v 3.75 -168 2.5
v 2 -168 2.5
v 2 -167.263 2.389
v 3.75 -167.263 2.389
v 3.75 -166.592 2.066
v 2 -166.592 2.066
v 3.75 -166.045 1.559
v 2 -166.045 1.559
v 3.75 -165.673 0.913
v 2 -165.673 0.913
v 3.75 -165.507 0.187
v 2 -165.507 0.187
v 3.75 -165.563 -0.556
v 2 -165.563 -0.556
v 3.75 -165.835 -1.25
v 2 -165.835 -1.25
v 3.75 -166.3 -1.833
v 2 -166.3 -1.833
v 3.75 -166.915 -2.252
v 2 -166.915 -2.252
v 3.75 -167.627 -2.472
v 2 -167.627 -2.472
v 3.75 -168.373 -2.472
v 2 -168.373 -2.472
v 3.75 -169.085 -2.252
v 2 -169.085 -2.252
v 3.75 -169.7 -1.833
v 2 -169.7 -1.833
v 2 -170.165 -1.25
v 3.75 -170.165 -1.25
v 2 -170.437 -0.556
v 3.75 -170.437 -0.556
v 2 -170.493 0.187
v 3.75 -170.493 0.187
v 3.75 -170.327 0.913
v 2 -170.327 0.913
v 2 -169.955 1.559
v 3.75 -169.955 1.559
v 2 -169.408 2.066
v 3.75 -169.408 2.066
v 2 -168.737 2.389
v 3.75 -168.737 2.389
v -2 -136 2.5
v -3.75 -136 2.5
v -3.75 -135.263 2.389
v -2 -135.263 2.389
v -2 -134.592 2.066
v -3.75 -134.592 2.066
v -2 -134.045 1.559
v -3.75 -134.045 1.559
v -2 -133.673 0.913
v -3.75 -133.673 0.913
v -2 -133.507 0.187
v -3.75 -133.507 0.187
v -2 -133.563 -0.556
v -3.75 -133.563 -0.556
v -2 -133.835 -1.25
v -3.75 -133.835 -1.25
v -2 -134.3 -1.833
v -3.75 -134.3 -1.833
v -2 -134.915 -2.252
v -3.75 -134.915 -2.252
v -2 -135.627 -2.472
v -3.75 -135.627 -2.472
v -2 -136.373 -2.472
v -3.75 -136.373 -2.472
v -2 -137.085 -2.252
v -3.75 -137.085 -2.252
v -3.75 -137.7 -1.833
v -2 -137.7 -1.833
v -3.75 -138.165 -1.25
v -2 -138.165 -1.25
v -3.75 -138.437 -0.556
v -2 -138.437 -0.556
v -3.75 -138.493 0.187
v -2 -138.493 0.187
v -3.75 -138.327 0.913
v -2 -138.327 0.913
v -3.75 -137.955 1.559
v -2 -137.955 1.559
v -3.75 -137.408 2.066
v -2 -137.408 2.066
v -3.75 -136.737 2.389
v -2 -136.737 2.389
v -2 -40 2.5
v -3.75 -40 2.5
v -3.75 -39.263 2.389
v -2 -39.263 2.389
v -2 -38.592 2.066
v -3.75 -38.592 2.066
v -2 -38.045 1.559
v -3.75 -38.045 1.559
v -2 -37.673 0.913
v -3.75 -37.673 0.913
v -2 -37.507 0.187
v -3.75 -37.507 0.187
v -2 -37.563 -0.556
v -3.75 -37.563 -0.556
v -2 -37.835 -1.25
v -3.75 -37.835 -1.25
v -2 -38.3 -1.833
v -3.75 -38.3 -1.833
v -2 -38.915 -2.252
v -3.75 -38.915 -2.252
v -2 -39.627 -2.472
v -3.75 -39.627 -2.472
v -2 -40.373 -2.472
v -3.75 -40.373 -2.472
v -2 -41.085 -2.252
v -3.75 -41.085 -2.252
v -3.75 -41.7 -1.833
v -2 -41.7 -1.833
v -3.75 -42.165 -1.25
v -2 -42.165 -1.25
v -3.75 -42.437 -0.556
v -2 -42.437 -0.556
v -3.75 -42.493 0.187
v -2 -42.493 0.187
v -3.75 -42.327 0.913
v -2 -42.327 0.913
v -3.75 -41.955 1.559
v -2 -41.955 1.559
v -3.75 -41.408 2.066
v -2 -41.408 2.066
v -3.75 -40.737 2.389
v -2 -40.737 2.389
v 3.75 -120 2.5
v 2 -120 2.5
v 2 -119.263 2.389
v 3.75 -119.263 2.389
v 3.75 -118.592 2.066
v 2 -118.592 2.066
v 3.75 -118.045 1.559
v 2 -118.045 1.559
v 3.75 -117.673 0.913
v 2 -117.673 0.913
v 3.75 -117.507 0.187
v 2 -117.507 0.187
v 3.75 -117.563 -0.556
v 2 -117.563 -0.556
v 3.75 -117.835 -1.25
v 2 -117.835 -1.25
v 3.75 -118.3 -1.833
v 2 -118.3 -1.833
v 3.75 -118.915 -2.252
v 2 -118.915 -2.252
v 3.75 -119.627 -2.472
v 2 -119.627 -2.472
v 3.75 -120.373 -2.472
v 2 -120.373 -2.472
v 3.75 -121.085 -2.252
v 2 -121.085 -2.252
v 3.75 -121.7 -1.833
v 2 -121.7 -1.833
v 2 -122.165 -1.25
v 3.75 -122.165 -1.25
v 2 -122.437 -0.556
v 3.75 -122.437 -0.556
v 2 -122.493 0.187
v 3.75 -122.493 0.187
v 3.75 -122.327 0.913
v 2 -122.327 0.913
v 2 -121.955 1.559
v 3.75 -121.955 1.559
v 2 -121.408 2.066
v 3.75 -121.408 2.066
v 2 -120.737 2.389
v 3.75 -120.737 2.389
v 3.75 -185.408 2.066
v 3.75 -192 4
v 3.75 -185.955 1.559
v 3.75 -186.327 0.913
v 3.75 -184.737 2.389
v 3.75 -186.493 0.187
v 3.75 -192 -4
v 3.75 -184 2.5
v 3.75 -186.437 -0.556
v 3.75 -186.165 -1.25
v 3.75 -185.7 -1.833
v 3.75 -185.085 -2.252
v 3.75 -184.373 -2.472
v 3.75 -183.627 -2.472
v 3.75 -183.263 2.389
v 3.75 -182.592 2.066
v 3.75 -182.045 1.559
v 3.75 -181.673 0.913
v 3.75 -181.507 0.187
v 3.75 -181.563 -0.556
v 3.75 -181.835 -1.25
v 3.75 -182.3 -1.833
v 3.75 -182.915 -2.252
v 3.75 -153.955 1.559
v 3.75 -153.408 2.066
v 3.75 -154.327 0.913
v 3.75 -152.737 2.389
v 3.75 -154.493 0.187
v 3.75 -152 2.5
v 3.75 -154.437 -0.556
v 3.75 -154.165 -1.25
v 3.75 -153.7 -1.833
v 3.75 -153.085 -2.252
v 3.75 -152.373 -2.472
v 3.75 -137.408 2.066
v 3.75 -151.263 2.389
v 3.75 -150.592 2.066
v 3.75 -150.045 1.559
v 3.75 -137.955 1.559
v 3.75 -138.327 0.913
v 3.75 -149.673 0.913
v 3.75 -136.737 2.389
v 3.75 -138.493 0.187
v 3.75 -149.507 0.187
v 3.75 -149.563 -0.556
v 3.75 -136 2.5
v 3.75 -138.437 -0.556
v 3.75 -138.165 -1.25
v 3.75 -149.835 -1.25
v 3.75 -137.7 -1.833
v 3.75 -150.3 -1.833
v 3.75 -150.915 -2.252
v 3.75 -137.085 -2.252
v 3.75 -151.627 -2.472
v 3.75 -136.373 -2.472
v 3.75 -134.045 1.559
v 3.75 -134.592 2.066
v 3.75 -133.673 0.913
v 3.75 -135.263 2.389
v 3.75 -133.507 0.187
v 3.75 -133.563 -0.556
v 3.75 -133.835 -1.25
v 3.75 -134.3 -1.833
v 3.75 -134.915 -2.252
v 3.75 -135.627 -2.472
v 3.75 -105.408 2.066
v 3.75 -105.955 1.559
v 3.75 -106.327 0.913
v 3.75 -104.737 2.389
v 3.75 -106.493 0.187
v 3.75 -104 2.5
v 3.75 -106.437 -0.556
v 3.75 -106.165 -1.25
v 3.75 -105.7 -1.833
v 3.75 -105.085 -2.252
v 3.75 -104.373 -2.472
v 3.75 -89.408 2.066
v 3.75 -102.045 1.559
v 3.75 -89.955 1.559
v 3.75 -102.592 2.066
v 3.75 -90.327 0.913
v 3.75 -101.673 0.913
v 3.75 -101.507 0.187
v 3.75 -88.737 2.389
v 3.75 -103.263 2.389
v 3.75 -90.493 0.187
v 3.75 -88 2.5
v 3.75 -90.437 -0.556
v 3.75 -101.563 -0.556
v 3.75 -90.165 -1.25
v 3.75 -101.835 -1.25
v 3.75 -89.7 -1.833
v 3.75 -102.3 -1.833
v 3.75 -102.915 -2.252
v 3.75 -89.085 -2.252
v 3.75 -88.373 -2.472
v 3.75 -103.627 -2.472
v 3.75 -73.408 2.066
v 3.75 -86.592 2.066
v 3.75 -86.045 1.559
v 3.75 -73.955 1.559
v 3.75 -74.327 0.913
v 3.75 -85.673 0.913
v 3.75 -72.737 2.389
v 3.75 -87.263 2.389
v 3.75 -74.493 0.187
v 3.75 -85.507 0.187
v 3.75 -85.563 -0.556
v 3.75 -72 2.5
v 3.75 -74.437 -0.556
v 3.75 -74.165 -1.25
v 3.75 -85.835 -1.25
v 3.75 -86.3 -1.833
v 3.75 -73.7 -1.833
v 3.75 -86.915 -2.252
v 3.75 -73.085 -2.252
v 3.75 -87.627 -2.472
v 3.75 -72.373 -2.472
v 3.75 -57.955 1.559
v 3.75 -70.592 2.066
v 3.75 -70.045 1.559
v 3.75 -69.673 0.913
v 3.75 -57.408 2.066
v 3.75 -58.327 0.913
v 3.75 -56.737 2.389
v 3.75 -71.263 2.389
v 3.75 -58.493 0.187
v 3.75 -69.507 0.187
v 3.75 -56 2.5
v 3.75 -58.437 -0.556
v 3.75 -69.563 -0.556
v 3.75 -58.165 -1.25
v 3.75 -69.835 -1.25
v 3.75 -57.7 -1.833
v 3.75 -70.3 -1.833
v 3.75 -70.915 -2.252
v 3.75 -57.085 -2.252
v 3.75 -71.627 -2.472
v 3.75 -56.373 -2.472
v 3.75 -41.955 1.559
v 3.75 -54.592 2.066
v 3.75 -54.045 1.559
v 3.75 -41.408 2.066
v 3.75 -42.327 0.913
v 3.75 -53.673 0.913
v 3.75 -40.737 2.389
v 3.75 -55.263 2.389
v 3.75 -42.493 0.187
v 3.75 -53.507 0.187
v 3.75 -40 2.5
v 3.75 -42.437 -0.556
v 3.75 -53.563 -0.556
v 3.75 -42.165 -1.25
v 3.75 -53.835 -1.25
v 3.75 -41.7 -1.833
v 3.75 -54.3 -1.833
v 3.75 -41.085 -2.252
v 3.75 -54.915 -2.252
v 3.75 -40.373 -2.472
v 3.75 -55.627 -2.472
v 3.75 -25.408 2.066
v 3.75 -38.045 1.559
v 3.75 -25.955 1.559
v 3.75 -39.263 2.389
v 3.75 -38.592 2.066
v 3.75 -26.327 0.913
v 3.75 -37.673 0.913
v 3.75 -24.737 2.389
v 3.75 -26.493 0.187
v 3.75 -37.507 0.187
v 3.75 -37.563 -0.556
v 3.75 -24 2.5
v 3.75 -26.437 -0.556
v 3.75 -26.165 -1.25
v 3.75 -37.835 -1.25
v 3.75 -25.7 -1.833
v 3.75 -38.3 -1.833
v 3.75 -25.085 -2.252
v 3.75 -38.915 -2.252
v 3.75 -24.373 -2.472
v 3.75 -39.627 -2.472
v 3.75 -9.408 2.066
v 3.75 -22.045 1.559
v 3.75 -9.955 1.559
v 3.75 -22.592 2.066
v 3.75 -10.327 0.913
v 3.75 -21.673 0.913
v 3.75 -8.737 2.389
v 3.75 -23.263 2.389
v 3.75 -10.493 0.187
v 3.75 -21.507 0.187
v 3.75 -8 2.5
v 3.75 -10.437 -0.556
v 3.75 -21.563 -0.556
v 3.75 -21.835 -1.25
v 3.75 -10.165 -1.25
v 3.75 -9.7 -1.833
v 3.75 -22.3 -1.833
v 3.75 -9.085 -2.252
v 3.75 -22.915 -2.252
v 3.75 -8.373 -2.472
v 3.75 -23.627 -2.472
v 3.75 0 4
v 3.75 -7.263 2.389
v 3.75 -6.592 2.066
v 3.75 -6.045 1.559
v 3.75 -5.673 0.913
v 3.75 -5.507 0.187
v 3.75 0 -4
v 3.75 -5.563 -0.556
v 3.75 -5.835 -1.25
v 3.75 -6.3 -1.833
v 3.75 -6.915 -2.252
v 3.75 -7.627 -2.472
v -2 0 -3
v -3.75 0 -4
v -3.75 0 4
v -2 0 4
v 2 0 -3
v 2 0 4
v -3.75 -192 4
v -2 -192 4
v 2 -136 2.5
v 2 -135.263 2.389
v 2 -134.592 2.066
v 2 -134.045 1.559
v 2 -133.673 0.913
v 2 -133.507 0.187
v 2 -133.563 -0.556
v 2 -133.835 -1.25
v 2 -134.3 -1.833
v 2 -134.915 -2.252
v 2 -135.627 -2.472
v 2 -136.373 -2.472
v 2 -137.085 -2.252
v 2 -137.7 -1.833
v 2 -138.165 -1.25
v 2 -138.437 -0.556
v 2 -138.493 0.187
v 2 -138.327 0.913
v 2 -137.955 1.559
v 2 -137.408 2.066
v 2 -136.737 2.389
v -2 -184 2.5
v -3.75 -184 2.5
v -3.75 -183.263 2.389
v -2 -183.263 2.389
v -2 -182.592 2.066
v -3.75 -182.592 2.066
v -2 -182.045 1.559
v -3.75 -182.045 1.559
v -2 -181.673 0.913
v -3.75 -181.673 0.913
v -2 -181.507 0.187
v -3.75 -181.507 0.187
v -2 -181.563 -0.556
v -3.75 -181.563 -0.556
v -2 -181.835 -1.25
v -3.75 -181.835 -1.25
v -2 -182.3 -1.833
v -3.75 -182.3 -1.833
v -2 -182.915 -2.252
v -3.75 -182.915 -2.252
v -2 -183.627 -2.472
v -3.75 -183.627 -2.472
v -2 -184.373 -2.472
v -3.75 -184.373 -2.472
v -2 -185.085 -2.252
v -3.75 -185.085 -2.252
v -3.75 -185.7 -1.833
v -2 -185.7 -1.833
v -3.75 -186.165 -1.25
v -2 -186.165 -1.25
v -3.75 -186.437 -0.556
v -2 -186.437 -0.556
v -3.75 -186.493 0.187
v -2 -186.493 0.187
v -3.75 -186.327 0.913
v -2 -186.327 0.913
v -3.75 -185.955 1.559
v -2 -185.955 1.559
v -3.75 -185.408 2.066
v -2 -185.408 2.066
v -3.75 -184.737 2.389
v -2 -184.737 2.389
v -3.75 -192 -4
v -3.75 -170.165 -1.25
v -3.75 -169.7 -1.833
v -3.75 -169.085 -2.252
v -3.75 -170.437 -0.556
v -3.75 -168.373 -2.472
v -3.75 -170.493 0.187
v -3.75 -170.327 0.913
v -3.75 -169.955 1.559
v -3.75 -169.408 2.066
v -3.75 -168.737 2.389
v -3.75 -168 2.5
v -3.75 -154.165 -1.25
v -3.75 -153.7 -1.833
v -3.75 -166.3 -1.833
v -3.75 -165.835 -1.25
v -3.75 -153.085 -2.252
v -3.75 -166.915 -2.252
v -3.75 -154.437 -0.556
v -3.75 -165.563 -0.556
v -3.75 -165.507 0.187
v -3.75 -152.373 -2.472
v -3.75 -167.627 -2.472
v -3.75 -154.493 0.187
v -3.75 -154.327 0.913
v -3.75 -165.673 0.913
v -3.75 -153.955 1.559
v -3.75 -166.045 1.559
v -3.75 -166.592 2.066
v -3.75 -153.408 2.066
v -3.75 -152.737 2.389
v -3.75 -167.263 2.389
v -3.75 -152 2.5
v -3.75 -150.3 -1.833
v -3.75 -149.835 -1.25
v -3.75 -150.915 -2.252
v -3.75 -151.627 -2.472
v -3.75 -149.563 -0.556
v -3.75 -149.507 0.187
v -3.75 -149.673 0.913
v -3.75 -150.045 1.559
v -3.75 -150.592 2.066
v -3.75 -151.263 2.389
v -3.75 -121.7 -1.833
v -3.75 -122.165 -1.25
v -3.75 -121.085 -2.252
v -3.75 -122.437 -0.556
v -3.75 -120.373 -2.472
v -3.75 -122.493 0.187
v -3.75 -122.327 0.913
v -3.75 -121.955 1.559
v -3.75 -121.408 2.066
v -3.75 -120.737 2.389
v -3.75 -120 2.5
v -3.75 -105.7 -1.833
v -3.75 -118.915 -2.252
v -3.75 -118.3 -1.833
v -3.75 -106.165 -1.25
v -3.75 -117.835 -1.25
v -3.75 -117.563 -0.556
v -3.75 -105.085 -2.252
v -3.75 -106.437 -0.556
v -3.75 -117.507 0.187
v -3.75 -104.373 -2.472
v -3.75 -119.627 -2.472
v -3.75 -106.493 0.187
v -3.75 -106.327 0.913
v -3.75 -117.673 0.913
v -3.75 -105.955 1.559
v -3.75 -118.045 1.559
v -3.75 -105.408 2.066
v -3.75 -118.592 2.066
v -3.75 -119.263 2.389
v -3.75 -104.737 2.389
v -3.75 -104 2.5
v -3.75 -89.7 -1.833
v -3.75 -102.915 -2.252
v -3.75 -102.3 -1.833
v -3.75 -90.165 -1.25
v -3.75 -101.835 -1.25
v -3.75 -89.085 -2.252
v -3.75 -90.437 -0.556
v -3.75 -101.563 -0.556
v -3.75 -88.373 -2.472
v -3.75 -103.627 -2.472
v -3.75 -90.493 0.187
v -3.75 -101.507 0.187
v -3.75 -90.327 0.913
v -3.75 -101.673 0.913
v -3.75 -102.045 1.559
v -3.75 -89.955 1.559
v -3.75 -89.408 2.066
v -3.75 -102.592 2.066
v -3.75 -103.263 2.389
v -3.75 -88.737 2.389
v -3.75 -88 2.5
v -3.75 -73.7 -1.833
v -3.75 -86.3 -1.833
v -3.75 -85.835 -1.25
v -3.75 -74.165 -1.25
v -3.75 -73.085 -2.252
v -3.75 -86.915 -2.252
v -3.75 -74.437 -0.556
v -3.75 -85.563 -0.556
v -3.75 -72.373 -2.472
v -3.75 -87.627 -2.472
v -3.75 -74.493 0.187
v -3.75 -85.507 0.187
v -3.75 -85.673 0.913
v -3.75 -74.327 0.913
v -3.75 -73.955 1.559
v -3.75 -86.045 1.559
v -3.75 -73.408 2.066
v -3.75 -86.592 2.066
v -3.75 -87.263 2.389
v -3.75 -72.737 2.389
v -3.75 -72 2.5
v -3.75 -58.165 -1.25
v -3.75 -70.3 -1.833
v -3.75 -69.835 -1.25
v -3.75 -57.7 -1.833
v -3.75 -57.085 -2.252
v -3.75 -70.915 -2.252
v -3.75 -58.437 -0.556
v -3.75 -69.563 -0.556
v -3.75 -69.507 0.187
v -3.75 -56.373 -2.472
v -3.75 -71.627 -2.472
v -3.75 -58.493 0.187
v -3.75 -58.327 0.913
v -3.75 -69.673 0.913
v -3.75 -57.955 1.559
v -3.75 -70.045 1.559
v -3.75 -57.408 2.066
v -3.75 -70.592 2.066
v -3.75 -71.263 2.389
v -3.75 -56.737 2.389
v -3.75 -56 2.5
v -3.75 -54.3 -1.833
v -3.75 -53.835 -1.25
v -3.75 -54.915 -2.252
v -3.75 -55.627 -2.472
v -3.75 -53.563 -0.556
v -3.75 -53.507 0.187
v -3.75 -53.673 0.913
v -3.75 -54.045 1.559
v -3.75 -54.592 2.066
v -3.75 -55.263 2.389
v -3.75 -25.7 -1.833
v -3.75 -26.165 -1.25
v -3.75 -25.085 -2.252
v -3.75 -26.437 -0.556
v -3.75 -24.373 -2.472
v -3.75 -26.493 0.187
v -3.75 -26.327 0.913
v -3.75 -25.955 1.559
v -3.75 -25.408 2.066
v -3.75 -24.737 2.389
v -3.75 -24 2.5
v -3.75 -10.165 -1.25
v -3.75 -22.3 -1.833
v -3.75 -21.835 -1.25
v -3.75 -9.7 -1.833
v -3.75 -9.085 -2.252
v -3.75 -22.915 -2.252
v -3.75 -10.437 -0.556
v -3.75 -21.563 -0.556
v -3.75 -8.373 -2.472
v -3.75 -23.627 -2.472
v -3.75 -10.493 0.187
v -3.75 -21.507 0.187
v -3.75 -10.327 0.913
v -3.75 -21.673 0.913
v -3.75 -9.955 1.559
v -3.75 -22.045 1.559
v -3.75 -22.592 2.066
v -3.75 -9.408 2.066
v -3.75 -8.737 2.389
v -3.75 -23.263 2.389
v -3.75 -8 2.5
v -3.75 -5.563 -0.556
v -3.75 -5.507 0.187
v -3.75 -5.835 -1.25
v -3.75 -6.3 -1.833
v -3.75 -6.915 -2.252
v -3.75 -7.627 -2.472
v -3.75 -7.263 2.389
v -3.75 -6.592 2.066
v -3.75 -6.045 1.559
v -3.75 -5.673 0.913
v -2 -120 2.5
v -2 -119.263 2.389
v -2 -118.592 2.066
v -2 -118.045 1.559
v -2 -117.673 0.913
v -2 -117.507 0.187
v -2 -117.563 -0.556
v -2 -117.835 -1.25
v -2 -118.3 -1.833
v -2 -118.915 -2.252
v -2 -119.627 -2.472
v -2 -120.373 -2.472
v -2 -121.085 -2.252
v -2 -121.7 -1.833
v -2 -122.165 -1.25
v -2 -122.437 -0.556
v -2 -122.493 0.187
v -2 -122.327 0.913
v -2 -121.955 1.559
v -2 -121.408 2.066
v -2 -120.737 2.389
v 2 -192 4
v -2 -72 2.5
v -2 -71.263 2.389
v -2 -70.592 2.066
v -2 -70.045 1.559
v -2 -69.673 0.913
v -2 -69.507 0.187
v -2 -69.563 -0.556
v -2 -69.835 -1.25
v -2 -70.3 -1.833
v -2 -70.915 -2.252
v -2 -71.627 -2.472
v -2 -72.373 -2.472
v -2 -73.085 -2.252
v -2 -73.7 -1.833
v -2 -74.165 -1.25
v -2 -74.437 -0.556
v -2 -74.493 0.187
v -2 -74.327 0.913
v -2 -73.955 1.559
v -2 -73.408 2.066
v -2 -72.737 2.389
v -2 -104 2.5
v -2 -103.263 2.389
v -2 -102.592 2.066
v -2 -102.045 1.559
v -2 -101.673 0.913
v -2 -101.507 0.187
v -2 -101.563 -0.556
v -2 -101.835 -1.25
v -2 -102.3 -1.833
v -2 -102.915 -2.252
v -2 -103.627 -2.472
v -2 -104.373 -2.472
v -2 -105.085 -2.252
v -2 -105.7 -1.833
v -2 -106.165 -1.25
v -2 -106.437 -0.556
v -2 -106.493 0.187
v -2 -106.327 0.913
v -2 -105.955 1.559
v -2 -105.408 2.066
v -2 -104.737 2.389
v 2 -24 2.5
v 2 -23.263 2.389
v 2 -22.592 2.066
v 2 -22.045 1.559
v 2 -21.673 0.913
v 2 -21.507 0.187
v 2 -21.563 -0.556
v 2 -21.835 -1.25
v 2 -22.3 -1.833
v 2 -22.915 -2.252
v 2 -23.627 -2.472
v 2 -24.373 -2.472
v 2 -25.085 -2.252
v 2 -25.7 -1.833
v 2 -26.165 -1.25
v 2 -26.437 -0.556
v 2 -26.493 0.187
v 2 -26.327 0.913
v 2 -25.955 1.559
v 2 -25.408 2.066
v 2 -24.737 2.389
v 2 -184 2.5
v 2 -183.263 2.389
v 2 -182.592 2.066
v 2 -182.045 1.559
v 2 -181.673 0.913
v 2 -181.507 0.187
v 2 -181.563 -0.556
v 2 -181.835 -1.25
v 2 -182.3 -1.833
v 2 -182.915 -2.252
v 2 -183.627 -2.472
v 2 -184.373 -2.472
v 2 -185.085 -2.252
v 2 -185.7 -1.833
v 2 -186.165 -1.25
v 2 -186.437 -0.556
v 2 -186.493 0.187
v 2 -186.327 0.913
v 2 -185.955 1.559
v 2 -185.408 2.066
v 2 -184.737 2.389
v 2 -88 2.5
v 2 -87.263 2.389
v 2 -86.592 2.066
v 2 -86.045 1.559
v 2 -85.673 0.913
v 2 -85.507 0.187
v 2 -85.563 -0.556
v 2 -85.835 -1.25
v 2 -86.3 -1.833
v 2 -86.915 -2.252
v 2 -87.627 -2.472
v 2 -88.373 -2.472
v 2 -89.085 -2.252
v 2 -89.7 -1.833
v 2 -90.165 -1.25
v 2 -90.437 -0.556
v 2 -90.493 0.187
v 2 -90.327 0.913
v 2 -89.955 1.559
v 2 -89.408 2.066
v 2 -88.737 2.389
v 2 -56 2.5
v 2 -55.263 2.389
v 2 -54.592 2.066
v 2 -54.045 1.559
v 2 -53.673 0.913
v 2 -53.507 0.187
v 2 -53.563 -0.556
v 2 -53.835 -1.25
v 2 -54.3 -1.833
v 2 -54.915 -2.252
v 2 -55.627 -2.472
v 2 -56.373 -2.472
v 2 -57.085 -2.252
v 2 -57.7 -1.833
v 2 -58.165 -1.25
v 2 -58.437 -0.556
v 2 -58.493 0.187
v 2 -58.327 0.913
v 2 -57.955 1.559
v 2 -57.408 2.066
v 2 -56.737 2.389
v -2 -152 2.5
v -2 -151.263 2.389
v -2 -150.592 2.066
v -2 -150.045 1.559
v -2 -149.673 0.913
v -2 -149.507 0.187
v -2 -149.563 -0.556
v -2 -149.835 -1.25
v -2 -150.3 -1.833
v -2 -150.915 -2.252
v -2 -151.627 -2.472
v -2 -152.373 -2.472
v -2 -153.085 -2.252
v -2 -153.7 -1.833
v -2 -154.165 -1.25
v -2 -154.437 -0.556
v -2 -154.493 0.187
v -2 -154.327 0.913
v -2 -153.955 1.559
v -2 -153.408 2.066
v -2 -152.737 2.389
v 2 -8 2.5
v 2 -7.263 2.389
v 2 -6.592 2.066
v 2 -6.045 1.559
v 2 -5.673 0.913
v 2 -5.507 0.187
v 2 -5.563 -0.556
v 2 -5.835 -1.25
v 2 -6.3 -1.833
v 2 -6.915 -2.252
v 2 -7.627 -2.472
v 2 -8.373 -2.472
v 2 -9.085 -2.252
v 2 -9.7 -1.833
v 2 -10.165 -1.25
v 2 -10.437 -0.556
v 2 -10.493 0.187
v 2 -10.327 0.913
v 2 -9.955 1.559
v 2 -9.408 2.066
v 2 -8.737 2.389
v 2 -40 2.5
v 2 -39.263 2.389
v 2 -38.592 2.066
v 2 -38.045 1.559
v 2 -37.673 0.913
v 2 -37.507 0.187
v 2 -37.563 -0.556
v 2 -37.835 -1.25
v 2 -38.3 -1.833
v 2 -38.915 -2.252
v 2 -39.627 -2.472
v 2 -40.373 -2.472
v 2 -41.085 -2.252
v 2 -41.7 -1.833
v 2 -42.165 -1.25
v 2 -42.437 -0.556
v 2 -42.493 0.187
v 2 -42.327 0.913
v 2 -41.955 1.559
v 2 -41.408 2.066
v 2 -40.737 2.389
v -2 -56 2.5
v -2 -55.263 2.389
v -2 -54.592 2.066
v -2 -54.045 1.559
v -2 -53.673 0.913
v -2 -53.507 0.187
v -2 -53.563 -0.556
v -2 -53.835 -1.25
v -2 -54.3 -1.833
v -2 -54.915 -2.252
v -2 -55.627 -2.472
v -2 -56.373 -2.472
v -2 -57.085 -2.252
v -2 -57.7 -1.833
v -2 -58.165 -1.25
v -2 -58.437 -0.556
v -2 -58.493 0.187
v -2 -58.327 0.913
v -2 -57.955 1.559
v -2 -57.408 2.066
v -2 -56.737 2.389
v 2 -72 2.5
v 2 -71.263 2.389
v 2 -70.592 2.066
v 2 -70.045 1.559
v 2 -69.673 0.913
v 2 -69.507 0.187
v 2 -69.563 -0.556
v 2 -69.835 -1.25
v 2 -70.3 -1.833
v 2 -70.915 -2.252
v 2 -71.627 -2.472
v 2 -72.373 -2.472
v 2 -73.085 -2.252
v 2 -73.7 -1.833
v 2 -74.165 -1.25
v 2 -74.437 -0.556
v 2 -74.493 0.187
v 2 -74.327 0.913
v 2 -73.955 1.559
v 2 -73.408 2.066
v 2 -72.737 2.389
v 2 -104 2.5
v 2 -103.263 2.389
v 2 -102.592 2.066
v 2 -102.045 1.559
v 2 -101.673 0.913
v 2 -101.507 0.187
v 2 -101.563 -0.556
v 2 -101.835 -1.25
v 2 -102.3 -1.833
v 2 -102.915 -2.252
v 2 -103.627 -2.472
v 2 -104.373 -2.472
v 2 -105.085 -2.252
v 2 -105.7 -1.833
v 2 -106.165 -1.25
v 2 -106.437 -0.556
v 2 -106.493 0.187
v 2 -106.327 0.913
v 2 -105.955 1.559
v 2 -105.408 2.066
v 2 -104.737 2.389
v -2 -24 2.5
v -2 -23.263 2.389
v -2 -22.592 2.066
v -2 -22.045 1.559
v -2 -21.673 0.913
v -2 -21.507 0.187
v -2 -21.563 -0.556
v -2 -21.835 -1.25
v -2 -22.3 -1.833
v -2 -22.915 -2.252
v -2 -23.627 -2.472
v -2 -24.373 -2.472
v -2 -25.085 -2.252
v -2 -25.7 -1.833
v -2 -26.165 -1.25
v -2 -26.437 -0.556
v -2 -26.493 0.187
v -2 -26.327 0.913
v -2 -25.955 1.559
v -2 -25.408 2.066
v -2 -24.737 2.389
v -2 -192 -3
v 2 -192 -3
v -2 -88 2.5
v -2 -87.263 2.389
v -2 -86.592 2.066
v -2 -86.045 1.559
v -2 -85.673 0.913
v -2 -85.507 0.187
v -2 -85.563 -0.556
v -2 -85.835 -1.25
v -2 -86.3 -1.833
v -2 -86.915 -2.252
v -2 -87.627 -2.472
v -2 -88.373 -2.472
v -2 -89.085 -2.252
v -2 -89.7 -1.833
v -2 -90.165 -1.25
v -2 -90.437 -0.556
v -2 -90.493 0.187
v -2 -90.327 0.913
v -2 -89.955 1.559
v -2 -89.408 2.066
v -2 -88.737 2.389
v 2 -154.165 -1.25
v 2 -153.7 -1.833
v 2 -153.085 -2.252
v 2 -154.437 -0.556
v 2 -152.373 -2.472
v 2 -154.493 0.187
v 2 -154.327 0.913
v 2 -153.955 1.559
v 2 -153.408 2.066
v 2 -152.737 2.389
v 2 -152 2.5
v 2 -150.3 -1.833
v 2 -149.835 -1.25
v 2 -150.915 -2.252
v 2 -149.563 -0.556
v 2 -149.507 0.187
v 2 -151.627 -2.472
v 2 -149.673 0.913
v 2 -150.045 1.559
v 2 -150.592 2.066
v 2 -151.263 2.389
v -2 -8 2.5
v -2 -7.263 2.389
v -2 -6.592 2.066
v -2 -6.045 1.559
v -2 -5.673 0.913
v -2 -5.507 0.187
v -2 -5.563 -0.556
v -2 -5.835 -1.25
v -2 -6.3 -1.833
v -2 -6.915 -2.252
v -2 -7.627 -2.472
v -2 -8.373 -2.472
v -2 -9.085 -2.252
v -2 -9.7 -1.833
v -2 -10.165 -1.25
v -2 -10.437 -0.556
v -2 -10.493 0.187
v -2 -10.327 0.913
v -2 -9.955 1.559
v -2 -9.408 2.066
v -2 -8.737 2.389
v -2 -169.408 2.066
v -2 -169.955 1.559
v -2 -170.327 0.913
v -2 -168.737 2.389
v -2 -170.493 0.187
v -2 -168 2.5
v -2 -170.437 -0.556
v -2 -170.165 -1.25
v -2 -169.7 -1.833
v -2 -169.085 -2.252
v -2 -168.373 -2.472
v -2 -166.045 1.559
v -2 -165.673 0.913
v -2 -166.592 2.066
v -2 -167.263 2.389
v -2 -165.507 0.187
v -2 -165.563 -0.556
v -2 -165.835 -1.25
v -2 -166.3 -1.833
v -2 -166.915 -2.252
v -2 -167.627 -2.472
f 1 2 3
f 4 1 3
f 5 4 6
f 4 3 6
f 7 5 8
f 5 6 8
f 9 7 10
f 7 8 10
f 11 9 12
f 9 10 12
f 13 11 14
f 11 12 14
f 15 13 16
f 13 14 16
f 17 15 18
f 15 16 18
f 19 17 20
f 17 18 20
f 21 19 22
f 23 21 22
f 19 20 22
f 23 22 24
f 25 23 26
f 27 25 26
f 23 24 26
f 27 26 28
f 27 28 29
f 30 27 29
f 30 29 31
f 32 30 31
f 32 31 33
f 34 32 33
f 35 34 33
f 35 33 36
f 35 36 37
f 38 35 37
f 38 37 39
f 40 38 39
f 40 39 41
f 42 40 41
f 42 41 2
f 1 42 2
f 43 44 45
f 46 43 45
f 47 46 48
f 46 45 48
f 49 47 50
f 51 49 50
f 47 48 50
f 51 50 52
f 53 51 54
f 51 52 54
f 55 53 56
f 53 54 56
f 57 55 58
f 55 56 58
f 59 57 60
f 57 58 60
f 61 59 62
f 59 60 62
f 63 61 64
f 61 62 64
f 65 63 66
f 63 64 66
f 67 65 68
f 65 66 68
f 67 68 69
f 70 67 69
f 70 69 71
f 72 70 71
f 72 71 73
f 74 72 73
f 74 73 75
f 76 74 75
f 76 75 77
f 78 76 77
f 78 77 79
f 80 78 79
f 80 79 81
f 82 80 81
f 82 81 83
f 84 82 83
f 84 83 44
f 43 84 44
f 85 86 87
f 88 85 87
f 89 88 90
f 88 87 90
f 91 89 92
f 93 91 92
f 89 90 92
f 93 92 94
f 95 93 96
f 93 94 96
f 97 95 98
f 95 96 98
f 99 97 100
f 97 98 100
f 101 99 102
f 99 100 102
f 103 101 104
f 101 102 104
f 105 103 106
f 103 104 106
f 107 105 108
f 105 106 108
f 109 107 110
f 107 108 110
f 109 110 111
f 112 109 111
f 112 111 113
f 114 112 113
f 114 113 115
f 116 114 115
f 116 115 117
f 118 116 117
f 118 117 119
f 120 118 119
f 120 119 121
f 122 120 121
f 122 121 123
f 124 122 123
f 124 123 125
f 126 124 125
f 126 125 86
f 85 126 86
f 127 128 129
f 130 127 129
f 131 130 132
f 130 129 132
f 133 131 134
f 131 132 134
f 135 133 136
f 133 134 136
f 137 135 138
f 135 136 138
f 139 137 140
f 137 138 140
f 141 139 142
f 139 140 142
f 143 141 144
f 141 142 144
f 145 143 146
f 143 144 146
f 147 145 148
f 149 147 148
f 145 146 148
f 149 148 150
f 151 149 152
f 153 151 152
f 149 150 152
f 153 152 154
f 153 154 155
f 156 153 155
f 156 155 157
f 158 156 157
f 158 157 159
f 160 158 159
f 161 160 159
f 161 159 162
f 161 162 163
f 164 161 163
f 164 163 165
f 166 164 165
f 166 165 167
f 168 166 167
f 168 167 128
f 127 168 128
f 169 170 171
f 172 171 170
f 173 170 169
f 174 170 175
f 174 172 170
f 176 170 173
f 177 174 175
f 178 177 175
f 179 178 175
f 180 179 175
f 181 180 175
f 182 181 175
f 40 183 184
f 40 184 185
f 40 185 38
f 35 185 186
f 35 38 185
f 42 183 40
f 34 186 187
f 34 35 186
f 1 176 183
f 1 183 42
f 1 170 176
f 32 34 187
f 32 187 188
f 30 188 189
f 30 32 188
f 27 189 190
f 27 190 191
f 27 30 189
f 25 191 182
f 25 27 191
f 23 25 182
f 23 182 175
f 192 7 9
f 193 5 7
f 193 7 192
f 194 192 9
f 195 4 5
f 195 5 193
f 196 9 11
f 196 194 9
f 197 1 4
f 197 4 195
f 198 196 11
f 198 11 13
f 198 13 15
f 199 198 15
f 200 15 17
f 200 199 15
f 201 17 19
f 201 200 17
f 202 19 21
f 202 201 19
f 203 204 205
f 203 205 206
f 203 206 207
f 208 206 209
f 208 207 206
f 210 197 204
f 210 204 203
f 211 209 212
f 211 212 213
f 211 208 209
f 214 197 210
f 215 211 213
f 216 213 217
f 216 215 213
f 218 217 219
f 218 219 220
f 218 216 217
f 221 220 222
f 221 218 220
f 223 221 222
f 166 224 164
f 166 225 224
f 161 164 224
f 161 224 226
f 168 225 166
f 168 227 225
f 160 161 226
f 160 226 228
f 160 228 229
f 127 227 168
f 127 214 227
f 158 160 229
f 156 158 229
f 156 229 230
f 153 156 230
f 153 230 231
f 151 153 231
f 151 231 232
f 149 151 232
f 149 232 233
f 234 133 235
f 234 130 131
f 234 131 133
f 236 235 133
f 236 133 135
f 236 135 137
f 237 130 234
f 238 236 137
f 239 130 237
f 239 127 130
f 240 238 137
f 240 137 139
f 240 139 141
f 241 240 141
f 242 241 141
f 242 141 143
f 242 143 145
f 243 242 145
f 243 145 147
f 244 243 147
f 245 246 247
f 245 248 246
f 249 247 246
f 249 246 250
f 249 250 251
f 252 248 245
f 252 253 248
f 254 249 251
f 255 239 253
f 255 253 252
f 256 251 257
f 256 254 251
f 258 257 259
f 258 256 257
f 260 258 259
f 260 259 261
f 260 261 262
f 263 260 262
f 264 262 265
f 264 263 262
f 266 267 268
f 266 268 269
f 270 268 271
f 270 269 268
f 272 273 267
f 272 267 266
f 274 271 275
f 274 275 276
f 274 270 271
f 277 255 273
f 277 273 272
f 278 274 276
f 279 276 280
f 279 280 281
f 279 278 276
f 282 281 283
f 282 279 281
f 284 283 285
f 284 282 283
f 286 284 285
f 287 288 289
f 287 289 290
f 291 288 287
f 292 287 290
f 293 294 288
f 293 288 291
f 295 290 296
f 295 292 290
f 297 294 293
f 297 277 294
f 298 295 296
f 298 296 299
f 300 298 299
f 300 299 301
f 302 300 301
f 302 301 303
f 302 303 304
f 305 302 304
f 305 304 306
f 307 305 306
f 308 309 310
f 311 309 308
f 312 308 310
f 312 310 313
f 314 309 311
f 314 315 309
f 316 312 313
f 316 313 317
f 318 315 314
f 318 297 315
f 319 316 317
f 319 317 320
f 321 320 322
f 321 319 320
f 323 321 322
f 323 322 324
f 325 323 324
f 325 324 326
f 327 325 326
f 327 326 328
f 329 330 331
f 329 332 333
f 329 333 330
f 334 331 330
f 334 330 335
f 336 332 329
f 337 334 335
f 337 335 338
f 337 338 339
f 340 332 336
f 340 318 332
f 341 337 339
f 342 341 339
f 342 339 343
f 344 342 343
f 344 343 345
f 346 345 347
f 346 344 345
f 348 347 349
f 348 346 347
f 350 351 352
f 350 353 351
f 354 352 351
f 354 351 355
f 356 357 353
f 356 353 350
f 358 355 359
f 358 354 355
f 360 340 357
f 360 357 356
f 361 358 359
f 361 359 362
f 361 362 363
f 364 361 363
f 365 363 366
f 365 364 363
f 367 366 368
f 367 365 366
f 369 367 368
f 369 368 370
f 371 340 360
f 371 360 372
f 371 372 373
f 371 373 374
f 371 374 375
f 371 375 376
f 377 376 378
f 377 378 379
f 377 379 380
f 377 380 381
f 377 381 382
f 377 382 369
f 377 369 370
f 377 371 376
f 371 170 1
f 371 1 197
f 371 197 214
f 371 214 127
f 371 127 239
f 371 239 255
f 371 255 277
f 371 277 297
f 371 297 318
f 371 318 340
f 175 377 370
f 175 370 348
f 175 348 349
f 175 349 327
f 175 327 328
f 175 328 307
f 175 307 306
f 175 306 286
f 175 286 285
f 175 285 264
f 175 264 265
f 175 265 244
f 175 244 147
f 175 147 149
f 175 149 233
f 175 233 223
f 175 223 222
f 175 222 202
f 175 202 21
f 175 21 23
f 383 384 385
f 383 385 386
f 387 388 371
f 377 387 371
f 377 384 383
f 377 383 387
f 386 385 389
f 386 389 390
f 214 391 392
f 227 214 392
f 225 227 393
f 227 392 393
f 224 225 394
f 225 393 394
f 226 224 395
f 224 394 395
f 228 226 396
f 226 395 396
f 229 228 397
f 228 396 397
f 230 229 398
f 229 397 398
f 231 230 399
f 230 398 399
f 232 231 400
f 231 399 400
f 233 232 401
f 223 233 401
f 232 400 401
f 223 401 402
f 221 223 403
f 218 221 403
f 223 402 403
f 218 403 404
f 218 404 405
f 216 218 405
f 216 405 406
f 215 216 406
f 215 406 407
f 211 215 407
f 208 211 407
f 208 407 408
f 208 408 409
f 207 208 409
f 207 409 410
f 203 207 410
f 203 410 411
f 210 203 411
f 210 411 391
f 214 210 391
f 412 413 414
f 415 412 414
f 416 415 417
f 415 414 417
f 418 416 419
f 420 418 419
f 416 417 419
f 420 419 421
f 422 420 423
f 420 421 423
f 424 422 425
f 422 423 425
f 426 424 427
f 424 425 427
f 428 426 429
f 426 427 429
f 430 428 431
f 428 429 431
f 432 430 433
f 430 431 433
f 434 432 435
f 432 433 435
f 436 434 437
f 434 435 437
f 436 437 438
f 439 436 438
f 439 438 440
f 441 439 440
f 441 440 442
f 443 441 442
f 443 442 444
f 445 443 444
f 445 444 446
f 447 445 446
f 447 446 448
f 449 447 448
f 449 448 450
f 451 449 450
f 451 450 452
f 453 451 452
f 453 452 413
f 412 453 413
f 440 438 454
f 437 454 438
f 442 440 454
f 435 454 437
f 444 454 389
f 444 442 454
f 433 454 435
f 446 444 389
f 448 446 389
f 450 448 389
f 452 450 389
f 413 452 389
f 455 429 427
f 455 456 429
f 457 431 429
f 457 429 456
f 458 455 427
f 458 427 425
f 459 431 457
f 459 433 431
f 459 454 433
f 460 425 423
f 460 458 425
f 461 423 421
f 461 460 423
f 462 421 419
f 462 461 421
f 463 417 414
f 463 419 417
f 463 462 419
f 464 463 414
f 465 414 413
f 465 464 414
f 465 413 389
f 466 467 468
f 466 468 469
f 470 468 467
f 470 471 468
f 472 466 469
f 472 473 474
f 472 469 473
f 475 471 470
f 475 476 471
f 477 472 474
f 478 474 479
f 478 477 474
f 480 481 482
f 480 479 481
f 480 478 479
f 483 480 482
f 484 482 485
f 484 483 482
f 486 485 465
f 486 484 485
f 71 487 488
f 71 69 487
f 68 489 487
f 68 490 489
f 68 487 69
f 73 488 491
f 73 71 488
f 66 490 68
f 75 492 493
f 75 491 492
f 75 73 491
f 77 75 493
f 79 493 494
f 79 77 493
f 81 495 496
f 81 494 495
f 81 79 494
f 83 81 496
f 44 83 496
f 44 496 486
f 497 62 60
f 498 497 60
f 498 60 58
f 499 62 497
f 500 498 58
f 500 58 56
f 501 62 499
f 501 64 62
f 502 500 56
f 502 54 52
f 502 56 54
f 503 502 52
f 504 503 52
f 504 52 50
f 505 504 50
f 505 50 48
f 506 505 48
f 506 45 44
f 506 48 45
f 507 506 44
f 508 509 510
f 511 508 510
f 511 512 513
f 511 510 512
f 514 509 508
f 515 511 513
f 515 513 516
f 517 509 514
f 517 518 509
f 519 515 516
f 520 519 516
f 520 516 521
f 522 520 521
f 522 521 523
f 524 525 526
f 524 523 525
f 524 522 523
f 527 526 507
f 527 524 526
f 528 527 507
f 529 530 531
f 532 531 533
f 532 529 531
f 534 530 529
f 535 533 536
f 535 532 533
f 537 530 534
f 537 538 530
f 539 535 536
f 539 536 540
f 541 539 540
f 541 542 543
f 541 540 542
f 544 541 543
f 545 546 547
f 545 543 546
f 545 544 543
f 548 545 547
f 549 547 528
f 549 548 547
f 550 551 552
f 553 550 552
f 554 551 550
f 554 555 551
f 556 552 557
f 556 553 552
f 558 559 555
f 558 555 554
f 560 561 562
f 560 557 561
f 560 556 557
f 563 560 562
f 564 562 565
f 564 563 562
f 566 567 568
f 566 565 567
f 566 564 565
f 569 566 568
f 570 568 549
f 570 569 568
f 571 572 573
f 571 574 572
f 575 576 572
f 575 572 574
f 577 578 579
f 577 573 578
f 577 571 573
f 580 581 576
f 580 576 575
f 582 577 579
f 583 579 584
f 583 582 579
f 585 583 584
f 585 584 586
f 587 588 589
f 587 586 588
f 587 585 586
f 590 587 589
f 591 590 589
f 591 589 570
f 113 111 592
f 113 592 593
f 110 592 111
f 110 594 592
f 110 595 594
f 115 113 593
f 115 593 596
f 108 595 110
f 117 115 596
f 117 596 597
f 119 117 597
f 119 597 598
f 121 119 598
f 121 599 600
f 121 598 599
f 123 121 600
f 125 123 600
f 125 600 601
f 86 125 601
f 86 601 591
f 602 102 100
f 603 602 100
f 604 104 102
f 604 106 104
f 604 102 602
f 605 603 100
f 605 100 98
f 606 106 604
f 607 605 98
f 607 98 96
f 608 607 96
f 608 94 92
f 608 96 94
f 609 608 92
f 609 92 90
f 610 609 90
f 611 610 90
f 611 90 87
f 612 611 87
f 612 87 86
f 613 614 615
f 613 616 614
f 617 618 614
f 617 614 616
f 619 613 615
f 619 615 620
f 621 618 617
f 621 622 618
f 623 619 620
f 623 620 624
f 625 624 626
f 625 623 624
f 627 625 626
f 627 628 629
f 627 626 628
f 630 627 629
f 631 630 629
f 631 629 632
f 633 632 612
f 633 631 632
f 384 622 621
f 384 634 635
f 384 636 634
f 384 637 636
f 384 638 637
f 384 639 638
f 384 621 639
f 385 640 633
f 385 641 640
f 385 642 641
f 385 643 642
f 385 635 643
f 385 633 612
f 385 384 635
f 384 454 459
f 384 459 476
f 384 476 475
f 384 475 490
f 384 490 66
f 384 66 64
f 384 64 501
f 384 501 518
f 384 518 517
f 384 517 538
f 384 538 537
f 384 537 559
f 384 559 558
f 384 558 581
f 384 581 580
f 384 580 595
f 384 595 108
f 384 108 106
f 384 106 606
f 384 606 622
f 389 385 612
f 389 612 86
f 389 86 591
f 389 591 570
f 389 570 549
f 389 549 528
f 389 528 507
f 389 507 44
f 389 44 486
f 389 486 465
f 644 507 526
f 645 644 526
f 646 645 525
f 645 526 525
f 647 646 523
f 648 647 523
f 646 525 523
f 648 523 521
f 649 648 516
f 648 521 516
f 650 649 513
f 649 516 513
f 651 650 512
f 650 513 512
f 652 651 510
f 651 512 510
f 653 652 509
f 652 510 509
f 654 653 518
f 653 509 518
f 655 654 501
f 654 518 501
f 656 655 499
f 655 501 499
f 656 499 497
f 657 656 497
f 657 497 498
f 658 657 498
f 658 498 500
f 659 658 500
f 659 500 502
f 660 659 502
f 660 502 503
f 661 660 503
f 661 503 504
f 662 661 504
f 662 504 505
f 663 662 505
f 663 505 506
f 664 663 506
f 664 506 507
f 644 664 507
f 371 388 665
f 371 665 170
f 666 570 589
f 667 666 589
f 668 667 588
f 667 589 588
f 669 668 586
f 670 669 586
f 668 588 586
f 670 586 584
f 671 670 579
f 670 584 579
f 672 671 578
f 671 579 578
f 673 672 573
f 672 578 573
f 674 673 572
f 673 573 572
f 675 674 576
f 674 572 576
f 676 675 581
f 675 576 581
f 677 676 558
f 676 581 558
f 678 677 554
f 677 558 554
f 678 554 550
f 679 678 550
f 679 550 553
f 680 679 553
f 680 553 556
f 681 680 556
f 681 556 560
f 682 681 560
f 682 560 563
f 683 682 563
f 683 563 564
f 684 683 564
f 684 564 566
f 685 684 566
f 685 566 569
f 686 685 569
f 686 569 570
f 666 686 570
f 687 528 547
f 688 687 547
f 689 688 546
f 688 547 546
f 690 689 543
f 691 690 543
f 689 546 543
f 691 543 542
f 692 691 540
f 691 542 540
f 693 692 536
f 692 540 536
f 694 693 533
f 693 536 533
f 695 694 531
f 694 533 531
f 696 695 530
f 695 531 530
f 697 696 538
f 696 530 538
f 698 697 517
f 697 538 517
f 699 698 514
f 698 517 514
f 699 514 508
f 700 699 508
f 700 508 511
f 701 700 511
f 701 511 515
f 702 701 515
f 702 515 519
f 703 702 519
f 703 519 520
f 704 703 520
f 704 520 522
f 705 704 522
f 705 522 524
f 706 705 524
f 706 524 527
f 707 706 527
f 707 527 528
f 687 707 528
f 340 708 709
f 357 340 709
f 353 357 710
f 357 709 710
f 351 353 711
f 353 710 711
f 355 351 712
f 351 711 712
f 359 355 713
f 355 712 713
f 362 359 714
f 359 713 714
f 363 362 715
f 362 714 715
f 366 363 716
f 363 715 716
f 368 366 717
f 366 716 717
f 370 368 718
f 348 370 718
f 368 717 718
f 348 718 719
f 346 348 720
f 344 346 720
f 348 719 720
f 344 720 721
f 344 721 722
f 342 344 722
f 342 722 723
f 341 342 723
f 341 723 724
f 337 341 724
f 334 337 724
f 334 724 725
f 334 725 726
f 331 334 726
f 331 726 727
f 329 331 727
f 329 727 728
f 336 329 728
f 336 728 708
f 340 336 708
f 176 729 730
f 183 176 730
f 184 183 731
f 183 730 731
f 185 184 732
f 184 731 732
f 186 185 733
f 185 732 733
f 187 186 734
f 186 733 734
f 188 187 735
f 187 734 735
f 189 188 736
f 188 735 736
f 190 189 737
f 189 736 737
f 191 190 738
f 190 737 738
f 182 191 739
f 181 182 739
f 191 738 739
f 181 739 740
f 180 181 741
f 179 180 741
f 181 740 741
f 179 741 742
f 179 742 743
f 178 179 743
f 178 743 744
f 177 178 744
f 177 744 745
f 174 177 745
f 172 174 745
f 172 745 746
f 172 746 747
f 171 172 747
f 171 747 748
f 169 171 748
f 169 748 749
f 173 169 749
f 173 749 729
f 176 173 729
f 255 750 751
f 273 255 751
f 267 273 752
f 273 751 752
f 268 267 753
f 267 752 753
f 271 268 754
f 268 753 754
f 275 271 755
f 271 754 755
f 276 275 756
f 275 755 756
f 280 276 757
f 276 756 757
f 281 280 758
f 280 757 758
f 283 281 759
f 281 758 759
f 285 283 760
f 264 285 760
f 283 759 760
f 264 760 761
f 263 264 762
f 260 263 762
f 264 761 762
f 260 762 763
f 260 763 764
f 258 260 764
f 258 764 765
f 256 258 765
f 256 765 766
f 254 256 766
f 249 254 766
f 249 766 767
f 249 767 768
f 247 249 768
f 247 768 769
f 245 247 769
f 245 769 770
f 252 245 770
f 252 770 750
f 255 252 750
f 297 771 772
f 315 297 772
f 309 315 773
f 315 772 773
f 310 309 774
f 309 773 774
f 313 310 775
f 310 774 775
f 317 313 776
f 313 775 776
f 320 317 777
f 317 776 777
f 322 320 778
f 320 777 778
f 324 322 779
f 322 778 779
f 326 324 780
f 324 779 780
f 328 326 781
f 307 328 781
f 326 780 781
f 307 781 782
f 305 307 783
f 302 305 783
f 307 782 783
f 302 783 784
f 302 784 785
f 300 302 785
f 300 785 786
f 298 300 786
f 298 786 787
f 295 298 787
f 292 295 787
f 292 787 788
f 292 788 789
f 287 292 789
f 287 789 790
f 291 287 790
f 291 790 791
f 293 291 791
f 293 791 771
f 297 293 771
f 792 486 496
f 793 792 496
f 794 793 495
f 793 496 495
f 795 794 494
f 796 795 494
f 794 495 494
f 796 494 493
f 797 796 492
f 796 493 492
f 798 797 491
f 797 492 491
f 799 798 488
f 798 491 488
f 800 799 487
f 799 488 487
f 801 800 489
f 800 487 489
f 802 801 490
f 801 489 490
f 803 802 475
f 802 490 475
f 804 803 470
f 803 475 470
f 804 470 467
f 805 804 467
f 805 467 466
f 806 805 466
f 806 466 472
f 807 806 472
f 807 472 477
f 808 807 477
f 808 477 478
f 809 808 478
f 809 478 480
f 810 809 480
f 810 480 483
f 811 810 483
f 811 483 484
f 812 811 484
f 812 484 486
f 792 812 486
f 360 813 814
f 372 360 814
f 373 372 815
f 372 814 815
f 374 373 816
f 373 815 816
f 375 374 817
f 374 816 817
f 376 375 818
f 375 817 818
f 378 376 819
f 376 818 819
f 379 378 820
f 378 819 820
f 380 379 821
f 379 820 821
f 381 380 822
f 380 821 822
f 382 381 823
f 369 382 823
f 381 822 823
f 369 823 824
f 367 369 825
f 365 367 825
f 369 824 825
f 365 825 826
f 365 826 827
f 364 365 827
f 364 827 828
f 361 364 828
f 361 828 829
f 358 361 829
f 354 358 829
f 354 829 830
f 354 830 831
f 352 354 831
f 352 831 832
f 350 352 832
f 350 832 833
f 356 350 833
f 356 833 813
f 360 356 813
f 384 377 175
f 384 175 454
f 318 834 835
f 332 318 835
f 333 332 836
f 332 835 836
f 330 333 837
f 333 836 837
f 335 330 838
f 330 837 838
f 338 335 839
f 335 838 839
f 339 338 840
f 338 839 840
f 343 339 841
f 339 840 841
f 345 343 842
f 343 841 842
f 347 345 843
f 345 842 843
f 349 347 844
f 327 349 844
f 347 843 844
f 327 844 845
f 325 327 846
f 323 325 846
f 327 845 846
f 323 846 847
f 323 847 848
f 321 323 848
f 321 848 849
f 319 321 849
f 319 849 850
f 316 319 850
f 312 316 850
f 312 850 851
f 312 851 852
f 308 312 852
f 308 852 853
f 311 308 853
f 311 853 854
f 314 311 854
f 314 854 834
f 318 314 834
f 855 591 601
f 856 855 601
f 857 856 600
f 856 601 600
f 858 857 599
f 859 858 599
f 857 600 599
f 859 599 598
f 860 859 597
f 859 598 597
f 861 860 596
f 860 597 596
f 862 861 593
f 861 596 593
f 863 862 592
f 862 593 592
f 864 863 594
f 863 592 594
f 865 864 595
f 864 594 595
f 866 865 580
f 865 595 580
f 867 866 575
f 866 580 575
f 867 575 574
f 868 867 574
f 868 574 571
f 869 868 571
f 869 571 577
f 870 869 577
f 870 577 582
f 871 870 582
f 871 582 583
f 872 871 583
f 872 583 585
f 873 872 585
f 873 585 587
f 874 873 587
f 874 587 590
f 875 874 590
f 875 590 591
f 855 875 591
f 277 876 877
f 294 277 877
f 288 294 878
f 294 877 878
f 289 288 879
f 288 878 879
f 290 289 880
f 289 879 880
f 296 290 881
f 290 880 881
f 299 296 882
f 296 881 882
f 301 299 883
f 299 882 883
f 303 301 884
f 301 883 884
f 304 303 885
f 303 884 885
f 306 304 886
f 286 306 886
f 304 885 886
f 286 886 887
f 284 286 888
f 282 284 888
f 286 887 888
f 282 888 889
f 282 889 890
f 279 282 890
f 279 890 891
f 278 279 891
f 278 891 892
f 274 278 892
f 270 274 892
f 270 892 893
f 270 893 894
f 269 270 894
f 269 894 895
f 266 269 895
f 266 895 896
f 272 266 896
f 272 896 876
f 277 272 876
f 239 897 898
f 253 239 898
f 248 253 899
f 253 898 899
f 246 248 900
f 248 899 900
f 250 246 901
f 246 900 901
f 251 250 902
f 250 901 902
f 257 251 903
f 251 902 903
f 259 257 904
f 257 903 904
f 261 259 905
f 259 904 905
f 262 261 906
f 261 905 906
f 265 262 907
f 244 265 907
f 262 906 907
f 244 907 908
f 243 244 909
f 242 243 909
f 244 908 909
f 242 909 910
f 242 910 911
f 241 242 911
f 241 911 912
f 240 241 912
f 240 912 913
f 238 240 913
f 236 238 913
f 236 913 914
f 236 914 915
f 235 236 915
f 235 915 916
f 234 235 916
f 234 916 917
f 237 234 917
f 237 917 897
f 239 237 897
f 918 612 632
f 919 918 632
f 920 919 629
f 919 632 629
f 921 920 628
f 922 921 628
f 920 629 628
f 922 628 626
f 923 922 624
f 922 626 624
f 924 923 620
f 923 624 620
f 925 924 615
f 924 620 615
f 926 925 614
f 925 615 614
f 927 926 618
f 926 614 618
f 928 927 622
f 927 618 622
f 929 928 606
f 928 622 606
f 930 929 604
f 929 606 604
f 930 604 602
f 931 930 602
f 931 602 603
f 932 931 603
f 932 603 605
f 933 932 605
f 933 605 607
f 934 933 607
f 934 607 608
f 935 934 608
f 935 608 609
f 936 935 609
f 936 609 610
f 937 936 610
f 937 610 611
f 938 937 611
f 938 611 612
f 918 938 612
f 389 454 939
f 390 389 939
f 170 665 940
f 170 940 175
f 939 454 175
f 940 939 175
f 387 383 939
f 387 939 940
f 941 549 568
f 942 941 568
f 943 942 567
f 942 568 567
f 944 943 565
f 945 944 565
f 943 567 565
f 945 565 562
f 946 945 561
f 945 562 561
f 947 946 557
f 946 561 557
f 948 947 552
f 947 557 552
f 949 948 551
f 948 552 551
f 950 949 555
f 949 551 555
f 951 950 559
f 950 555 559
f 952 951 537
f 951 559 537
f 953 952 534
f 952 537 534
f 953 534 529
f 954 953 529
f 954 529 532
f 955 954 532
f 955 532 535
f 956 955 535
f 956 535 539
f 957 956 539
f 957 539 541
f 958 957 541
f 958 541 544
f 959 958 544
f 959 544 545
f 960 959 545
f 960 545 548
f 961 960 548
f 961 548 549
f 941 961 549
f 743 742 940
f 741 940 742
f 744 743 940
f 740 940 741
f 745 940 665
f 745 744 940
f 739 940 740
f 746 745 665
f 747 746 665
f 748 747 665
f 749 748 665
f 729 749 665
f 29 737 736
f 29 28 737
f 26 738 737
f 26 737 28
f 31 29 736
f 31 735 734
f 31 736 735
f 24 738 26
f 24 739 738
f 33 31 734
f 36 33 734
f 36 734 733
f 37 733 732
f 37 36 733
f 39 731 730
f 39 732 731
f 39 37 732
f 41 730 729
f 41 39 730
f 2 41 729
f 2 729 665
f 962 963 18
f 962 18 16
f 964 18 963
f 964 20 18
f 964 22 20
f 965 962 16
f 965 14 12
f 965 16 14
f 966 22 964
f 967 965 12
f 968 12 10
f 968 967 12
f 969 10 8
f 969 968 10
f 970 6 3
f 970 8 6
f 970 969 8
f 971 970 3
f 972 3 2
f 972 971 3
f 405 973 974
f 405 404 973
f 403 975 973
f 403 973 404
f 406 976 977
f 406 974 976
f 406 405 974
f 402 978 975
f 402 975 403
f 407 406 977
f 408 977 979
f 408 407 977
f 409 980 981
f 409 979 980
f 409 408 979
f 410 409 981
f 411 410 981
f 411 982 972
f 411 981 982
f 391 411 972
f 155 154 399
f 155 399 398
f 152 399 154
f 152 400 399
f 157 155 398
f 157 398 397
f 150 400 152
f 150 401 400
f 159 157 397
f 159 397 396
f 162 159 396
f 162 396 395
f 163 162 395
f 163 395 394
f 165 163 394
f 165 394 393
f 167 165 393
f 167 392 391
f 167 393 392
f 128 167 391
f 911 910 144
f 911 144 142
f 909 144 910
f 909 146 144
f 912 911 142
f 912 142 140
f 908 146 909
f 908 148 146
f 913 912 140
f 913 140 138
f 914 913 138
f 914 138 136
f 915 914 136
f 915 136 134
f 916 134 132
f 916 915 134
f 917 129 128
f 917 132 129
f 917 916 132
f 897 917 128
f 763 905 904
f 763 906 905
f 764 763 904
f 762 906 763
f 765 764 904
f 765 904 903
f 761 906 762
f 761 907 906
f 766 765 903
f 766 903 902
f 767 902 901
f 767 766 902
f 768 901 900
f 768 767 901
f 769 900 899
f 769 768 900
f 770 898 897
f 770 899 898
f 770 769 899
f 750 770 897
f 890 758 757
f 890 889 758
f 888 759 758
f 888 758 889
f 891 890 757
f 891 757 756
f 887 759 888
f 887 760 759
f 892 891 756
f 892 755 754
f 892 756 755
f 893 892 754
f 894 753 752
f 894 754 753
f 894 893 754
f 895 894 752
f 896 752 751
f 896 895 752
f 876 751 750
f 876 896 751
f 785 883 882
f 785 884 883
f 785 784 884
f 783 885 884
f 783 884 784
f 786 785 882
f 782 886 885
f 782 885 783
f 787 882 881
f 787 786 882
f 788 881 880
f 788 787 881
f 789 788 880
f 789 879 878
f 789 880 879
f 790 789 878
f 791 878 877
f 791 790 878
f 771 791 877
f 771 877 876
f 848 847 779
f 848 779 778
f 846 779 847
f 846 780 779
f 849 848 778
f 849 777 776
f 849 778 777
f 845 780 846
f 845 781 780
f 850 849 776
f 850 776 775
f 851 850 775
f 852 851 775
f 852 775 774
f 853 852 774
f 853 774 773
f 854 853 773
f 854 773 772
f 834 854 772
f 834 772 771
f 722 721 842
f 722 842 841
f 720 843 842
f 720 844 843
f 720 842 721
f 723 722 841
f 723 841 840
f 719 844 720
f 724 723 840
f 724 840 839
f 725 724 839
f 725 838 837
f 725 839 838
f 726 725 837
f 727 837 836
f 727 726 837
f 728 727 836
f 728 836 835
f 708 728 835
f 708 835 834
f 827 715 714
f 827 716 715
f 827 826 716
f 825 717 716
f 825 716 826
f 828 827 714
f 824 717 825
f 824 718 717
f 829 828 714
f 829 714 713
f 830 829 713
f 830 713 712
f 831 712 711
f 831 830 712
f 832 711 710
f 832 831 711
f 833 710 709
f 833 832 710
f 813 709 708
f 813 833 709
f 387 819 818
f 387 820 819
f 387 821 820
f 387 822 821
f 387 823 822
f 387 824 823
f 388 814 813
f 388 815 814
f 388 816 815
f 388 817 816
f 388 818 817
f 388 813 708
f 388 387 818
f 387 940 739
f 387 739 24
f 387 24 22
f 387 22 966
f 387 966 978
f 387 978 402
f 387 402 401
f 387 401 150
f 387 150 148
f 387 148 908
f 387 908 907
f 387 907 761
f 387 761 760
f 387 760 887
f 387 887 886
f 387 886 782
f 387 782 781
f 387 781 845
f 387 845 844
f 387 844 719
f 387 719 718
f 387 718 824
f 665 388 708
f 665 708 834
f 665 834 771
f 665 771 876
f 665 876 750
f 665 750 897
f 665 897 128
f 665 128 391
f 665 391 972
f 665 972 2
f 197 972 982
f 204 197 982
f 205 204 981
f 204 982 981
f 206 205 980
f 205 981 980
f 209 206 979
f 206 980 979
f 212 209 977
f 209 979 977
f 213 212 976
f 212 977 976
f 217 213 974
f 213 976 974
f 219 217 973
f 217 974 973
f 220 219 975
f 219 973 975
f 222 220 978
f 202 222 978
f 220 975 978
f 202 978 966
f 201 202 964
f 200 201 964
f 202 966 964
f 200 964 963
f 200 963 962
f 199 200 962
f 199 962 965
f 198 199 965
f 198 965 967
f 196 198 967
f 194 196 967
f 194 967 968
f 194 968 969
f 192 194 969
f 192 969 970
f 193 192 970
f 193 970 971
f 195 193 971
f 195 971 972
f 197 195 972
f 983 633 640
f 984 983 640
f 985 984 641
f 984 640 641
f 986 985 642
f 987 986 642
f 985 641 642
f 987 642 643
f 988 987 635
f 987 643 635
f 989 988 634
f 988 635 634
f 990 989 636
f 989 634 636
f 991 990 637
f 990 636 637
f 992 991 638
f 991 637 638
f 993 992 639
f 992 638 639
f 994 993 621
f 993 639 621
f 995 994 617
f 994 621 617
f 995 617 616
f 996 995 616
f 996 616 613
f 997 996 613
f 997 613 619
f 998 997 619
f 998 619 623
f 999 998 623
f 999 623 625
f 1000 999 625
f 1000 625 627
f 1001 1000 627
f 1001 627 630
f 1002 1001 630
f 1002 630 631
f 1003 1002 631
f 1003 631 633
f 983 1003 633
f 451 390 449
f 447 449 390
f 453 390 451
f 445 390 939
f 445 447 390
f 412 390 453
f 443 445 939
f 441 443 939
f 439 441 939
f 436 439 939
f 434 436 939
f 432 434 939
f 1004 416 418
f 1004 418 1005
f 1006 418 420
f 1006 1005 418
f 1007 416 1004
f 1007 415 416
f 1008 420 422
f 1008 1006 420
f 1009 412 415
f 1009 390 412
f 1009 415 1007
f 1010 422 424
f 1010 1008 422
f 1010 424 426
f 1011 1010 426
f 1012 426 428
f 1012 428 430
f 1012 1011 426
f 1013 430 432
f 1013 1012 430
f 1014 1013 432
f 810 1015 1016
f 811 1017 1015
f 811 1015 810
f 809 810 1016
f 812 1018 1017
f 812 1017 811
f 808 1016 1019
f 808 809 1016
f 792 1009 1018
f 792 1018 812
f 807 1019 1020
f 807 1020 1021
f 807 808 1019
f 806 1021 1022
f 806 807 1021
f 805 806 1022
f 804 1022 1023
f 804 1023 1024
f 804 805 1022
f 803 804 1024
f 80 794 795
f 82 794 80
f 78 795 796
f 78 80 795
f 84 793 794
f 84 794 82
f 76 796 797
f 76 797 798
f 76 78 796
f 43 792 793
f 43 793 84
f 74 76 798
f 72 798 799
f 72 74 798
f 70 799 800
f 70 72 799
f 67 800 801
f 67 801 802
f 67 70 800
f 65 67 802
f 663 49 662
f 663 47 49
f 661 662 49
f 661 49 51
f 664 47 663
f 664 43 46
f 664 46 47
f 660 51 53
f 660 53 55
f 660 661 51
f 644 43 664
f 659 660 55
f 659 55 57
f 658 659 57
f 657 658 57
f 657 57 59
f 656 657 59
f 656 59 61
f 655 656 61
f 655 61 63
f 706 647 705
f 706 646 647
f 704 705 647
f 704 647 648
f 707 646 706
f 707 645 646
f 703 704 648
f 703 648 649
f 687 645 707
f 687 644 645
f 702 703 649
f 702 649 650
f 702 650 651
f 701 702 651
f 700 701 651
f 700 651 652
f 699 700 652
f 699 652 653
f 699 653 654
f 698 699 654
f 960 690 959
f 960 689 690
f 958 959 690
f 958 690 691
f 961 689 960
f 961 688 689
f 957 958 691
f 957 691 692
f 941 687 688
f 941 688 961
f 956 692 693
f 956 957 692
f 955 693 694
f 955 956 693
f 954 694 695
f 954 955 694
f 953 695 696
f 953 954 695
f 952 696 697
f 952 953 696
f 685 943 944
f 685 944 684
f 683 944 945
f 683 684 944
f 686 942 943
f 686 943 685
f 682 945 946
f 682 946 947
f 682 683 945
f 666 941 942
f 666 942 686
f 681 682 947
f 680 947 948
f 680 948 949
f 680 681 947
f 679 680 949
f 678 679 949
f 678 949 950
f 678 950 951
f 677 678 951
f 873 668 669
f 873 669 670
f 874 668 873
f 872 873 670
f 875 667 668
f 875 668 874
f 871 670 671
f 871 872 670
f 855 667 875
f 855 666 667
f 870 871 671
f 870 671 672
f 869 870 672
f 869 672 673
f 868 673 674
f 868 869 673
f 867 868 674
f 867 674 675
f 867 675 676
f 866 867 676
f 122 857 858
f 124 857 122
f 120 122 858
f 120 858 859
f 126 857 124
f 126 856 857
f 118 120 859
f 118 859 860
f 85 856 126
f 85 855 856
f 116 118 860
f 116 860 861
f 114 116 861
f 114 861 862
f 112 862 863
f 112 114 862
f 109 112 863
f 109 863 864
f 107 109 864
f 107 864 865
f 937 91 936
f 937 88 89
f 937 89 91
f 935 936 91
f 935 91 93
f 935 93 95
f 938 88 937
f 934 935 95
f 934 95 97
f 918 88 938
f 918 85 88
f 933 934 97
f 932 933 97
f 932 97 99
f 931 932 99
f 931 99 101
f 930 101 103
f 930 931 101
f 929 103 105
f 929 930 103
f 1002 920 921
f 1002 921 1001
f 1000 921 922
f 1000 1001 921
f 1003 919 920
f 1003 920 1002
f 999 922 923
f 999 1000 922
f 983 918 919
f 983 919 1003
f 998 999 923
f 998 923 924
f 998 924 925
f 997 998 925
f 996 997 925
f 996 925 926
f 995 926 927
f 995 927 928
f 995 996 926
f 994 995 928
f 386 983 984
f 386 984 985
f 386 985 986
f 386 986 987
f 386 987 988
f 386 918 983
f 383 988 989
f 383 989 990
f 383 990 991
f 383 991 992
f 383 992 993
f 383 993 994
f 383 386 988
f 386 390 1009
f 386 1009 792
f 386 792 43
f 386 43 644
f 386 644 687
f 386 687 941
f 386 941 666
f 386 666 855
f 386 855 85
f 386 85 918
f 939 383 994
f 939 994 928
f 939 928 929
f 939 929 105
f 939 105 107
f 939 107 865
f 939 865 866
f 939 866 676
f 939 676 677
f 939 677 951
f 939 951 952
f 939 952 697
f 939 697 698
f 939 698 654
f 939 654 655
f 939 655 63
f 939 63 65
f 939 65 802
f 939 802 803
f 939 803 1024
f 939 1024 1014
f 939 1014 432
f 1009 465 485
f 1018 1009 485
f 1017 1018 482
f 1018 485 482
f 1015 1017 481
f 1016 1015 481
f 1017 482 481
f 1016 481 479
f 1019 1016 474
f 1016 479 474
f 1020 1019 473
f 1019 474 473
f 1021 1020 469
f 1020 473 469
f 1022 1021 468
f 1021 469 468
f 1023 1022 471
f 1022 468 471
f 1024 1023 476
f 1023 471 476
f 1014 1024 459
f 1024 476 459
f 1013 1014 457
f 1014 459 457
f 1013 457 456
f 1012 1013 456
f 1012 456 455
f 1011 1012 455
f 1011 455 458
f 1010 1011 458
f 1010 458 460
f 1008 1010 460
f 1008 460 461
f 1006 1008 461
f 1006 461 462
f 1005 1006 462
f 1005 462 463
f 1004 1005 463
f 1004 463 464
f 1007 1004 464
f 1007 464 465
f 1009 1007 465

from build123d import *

# Parameters (mm, degrees)
BASE_DEPTH  = 192
ESQUISSE2_R = 2.5
TROU_DEPTH  = 193.188058942


with BuildPart() as part:
    # Esquisse1 → Base (new body)
    with BuildSketch(Plane(origin=(0, 0, 0), x_dir=(1, 0, 0), z_dir=(0, 1, 0))):
        Polygon((-2, -4), (-2, 3), (2, 3), (2, -4), (3.75, -4), (3.75, 4), (-3.75, 4), (-3.75, -4), align=None)
    extrude(amount=-BASE_DEPTH)

    # Esquisse2 → Trou (cut, through all)
    with BuildSketch(Plane.ZY.offset(3.75)):
        with Locations((0, -8)):
            Circle(ESQUISSE2_R)
        with Locations((0, -24)):
            Circle(ESQUISSE2_R)
        with Locations((0, -40)):
            Circle(ESQUISSE2_R)
        with Locations((0, -56)):
            Circle(ESQUISSE2_R)
        with Locations((0, -72)):
            Circle(ESQUISSE2_R)
        with Locations((0, -88)):
            Circle(ESQUISSE2_R)
        with Locations((0, -104)):
            Circle(ESQUISSE2_R)
        with Locations((0, -120)):
            Circle(ESQUISSE2_R)
        with Locations((0, -136)):
            Circle(ESQUISSE2_R)
        with Locations((0, -152)):
            Circle(ESQUISSE2_R)
        with Locations((0, -168)):
            Circle(ESQUISSE2_R)
        with Locations((0, -184)):
            Circle(ESQUISSE2_R)
    extrude(amount=-TROU_DEPTH, mode=Mode.SUBTRACT)


solid = part.part
